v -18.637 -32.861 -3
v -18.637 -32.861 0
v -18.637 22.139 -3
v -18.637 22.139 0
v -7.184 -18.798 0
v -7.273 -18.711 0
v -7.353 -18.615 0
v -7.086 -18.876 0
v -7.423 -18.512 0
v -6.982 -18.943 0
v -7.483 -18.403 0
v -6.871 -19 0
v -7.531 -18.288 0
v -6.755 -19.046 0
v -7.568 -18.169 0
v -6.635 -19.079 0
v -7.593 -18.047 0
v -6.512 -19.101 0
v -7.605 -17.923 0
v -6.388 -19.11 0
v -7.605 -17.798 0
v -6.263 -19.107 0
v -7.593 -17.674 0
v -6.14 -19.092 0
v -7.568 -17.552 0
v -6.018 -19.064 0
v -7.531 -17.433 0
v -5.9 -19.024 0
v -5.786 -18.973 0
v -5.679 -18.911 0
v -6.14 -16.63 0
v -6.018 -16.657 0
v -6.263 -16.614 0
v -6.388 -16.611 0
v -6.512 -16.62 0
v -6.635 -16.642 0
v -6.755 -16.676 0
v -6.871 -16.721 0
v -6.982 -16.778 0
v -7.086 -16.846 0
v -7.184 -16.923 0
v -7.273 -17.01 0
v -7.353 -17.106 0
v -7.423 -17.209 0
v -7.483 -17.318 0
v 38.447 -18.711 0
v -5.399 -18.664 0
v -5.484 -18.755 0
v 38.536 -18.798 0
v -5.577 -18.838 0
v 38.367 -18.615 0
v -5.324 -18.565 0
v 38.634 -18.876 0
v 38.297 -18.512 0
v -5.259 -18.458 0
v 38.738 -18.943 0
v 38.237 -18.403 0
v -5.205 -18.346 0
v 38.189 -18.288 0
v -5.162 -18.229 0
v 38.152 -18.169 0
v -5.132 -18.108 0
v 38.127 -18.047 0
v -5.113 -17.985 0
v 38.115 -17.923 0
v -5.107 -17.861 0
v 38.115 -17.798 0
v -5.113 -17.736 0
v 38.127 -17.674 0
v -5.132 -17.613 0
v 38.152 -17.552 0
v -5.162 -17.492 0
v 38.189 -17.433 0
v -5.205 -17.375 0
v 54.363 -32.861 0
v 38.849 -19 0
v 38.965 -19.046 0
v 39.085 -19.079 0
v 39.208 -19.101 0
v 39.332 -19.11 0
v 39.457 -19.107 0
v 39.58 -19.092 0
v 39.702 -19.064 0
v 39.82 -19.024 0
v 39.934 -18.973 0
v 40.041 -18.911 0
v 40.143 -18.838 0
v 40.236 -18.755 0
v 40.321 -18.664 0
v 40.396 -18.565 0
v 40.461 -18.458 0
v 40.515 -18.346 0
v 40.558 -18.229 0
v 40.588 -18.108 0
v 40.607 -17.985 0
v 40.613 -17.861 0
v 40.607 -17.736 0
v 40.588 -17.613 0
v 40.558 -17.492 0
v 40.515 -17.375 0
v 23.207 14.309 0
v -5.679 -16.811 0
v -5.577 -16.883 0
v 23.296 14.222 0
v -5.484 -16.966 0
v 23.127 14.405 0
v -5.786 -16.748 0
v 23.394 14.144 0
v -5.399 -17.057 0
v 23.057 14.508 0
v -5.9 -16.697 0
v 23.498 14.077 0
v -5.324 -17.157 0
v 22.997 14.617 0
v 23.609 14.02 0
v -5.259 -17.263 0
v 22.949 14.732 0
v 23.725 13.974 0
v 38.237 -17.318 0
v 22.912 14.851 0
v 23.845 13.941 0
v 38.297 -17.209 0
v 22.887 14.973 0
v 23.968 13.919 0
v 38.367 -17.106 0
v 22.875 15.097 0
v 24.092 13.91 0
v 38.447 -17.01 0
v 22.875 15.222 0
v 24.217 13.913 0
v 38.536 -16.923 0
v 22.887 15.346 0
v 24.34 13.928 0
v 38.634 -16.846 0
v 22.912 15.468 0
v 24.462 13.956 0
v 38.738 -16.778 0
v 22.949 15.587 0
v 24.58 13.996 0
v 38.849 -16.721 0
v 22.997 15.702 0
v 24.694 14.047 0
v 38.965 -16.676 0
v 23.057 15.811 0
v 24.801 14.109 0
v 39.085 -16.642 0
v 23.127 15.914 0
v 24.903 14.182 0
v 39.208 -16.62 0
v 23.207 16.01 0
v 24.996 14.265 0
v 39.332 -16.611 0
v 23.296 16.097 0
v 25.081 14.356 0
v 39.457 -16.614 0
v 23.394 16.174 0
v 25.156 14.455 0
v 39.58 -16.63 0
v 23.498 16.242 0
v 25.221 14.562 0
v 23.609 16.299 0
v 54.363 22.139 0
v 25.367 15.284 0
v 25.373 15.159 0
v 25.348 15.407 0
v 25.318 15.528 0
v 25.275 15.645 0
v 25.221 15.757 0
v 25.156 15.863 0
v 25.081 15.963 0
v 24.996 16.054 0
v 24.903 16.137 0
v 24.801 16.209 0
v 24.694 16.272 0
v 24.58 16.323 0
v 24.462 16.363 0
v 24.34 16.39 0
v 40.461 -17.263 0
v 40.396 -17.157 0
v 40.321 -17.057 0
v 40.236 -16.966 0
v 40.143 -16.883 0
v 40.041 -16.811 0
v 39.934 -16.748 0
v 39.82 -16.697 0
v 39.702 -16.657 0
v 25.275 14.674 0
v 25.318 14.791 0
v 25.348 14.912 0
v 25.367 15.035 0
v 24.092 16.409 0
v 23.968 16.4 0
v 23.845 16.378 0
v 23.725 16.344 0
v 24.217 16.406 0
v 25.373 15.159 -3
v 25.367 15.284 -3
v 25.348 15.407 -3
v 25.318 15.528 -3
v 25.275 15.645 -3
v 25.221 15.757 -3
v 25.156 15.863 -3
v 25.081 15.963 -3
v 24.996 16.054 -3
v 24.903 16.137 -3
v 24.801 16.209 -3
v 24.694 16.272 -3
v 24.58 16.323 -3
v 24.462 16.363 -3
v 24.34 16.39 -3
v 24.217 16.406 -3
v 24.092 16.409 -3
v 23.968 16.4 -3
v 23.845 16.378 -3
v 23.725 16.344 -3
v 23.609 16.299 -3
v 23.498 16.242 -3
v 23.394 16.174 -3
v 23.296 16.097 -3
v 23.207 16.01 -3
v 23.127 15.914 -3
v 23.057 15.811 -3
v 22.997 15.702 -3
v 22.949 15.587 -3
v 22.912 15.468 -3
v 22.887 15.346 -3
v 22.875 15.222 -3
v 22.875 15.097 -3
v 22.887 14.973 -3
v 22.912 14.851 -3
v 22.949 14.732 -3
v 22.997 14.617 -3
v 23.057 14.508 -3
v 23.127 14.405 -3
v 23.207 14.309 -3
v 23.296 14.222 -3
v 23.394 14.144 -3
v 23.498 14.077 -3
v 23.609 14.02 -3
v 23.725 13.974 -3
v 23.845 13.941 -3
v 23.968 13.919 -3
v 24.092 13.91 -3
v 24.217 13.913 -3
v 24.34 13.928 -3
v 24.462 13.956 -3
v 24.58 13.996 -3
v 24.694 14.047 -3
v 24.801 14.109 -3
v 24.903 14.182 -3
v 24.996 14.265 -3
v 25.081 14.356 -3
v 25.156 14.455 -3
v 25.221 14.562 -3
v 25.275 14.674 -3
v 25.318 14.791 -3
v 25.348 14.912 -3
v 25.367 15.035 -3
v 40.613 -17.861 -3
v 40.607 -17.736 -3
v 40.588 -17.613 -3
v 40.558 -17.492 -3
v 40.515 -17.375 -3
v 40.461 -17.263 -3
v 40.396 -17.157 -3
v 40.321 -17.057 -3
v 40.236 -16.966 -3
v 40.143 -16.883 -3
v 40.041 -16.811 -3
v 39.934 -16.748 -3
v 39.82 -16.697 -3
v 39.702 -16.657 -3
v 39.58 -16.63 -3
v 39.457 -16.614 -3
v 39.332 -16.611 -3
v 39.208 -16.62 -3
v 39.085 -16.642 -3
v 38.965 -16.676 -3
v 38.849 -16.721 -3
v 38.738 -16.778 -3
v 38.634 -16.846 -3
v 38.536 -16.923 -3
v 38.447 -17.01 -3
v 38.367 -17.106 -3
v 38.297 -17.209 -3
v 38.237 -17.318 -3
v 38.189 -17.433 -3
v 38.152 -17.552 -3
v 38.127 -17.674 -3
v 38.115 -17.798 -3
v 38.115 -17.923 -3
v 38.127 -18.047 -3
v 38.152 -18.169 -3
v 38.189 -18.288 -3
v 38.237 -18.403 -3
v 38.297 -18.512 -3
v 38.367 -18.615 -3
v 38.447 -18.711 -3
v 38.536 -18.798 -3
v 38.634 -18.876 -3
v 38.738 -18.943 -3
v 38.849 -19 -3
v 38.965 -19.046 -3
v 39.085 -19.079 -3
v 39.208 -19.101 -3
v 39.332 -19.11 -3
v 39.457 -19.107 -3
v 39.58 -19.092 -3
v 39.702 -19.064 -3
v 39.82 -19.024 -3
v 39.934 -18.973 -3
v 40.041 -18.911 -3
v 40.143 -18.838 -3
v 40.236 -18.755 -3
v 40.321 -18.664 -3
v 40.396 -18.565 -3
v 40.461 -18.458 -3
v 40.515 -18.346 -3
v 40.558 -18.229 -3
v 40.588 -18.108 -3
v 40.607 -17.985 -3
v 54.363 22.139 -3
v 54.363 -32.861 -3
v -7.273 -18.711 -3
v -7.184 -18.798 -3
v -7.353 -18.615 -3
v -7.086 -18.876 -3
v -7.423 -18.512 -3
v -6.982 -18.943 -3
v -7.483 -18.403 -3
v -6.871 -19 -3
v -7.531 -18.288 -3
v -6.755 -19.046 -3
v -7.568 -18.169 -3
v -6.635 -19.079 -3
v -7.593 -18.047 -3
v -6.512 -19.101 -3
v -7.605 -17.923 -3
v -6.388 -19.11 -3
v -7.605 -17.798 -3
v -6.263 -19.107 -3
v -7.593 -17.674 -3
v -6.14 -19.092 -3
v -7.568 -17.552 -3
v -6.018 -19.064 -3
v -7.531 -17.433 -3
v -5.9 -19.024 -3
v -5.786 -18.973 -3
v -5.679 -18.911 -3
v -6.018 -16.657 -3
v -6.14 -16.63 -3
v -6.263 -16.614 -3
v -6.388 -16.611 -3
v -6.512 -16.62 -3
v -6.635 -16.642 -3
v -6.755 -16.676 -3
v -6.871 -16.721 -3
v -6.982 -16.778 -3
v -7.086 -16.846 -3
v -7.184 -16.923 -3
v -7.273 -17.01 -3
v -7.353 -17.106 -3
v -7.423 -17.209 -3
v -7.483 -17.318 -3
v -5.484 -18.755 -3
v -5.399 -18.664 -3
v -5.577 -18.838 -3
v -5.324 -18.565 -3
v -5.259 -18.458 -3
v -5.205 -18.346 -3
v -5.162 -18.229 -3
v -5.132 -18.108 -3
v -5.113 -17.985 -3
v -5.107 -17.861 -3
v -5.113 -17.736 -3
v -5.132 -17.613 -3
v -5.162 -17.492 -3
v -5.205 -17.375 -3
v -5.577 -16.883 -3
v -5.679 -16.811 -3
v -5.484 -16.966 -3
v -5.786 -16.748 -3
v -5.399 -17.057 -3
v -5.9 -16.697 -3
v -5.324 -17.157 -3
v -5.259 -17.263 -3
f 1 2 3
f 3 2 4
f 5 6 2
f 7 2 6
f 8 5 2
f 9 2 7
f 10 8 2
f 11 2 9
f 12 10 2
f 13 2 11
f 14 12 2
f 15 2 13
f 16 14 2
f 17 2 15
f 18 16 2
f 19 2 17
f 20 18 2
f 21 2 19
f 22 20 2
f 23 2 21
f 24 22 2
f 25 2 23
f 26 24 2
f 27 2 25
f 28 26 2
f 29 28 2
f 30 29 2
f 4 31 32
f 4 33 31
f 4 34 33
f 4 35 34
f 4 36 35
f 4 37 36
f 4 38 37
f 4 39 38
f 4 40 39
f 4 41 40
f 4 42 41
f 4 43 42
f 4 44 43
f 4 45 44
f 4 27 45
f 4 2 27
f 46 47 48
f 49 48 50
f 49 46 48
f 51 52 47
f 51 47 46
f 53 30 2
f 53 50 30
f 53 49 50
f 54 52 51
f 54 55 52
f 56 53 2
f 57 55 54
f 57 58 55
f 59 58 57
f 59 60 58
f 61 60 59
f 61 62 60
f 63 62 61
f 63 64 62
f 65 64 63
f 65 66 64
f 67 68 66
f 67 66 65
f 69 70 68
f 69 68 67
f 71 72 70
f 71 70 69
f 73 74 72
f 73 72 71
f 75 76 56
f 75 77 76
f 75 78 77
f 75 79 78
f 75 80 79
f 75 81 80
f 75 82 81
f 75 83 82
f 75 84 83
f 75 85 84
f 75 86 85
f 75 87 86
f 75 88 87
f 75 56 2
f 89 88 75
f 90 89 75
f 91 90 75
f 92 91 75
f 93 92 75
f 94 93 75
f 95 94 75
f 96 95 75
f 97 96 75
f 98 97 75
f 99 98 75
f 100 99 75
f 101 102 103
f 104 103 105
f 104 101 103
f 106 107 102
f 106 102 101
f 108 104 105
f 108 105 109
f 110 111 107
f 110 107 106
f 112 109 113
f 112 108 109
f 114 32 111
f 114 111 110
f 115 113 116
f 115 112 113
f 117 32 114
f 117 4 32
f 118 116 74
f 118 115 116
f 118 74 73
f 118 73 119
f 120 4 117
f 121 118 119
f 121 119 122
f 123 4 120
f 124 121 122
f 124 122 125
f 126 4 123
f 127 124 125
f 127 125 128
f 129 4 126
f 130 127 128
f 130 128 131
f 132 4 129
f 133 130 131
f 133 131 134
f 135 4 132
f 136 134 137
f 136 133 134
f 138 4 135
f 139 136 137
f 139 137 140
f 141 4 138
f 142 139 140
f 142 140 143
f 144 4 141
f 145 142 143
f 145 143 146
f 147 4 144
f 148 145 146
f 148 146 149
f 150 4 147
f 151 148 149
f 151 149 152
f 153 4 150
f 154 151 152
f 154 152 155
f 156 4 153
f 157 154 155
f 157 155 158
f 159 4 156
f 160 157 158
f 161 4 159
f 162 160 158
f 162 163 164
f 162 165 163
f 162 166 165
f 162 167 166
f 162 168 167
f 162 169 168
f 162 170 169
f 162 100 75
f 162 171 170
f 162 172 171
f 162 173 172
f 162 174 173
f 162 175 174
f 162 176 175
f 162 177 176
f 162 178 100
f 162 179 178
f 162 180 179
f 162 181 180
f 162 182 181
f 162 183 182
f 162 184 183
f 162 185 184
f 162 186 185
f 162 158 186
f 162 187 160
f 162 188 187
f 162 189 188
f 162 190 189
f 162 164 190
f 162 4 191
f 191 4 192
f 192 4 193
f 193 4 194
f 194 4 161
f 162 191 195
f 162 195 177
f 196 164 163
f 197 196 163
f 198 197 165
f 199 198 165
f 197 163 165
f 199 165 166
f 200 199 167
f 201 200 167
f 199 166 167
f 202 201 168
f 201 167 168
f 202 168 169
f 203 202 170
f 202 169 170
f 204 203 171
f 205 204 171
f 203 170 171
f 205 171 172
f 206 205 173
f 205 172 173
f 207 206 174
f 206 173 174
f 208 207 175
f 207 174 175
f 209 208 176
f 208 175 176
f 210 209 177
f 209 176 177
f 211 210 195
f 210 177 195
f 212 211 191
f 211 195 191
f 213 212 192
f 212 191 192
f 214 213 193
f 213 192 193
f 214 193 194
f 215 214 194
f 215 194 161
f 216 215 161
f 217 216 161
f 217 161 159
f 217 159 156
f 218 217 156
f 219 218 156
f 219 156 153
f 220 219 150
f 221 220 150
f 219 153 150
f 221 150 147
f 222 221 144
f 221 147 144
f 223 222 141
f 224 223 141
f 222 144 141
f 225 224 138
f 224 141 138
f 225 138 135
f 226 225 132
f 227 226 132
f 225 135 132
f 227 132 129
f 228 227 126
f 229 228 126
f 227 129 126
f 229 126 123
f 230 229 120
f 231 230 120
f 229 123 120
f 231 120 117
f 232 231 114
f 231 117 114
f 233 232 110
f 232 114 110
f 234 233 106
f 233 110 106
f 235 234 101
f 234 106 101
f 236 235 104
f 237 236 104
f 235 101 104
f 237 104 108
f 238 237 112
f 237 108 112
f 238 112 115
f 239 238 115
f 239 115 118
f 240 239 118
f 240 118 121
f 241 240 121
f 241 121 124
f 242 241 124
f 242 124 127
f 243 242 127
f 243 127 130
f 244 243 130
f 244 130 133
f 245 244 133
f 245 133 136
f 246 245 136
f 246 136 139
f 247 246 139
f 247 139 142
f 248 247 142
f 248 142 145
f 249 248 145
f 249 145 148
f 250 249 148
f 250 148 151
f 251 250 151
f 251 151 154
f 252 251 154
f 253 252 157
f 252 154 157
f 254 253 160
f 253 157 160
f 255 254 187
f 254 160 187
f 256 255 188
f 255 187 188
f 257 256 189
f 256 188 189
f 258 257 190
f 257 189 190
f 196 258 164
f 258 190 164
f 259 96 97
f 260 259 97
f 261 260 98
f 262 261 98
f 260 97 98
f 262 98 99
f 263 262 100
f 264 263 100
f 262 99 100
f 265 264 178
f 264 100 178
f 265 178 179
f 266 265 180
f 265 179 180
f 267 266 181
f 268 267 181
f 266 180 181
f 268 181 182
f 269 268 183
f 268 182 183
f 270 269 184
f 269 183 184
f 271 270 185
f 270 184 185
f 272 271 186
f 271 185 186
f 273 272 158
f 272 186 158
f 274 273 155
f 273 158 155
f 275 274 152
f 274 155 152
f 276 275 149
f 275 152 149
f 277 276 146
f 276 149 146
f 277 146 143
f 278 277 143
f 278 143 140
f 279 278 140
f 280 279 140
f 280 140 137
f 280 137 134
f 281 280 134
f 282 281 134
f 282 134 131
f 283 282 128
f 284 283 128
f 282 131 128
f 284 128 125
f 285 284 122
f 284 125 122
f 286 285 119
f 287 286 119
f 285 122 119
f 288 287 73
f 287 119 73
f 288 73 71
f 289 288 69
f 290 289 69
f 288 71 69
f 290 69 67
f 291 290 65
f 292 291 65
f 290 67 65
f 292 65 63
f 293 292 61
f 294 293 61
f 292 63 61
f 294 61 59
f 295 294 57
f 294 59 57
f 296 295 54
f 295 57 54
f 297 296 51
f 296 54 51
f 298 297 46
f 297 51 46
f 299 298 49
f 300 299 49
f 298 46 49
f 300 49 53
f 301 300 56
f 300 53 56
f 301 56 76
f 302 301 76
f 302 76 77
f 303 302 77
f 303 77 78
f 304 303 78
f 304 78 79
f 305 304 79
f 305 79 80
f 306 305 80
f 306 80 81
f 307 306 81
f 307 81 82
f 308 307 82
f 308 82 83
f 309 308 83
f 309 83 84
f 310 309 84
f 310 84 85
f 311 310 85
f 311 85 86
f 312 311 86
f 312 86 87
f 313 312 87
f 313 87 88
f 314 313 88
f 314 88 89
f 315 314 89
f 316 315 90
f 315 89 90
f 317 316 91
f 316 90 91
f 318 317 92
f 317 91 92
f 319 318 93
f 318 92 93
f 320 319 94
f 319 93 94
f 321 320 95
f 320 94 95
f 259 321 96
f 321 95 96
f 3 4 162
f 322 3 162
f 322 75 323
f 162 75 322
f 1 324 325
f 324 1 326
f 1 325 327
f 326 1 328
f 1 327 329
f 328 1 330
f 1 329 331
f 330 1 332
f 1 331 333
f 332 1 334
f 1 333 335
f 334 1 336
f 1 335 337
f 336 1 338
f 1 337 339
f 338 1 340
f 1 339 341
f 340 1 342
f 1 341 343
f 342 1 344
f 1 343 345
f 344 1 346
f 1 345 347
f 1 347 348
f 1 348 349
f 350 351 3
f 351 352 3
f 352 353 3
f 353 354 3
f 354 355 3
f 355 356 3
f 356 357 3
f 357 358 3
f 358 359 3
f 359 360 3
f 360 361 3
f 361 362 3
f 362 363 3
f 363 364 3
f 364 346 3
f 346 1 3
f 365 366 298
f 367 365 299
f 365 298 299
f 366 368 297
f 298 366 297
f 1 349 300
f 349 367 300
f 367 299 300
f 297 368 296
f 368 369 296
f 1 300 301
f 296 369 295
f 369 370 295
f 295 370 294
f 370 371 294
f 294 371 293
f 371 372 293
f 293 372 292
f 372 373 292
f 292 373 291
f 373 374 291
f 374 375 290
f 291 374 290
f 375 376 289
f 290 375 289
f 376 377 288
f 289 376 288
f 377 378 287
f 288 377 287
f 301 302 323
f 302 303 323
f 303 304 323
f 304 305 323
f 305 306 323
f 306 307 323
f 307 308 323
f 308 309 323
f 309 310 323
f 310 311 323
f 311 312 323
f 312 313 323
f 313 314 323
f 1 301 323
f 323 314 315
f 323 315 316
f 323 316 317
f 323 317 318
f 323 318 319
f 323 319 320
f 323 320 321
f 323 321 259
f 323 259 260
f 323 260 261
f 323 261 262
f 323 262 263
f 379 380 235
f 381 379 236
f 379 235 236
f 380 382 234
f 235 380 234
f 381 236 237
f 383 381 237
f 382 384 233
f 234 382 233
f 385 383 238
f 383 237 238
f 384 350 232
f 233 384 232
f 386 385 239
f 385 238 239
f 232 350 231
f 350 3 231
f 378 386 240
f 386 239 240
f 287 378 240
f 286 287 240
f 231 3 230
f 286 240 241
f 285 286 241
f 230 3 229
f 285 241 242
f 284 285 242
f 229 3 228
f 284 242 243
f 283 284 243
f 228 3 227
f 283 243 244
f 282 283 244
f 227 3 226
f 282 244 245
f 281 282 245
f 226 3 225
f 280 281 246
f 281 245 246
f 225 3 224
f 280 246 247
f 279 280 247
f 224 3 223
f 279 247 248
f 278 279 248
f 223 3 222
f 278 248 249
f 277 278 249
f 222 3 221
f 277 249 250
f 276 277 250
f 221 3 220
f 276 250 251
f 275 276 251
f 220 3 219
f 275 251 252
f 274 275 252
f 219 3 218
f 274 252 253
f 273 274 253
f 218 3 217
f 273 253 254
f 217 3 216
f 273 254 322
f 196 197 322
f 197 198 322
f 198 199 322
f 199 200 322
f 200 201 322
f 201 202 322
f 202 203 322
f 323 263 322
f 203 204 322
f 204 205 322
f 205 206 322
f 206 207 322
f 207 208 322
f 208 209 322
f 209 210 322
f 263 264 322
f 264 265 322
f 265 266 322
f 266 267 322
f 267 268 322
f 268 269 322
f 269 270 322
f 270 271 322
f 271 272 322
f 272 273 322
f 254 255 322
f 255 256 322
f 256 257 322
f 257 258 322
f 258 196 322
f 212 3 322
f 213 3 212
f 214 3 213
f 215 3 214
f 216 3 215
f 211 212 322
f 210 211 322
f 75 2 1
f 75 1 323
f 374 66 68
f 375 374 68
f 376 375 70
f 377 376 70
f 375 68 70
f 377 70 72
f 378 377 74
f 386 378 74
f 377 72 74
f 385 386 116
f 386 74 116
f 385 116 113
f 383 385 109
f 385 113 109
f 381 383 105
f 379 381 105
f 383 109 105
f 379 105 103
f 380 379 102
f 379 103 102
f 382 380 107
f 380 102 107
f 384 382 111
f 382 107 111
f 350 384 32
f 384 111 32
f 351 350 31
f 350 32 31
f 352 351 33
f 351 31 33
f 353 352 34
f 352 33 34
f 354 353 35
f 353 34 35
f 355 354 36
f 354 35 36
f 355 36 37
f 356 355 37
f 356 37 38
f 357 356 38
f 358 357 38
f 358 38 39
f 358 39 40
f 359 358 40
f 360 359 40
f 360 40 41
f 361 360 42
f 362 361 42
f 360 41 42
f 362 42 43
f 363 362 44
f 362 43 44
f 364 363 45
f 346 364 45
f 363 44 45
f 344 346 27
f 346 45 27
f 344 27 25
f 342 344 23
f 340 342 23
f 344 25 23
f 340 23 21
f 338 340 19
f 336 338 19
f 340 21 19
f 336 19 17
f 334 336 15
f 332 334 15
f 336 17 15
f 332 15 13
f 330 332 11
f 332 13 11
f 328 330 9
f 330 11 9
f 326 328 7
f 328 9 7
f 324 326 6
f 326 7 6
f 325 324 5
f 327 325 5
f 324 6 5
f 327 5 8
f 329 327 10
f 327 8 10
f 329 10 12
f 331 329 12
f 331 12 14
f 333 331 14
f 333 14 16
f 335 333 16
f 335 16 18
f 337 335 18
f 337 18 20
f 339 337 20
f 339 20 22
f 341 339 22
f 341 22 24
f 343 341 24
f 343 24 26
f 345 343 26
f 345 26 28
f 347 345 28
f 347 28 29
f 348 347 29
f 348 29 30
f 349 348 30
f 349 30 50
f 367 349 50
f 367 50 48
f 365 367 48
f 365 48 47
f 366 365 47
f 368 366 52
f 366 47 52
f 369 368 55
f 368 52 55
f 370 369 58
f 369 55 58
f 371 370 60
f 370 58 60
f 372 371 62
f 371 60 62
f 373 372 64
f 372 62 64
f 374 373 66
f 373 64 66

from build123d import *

# Parameters (mm, degrees)
F0_W     = 73
F0_H     = 55
F0_R     = 3.5
F0_R_2   = 1.25
F1_DEPTH = 3


# Not quite as in the source:
# - a feature names something its author has since deleted; it is built from what else it names


with BuildPart() as f1:
    # F0 (on Top) → F1 (new body)
    with BuildSketch(Plane.XY):
        with Locations((17.8632747996, -5.3606596088)):
            Rectangle(F0_W, F0_H)
        with Locations((-6.3567252004, -17.8606596088)):
            Circle(F0_R, mode=Mode.SUBTRACT)
        with BuildLine():
            ThreePointArc((39.3632747996, -14.3606596088), (41.8381485337, -15.3857858747), (42.8632747996, -17.8606596088))
            ThreePointArc((42.8632747996, -17.8606596088), (41.8381485337, -20.335533343), (39.3632747996, -21.3606596088))
            ThreePointArc((39.3632747996, -21.3606596088), (35.8632747996, -17.8606596088), (39.3632747996, -14.3606596088))
        make_face(mode=Mode.SUBTRACT)
        with Locations((24.1232747996, 15.1593403912)):
            Circle(F0_R, mode=Mode.SUBTRACT)
        with Locations((24.1232747996, 15.1593403912)):
            Circle(F0_R)
        with Locations((24.1232747996, 15.1593403912)):
            Circle(F0_R_2, mode=Mode.SUBTRACT)
        with BuildLine():
            ThreePointArc((39.3632747996, -21.3606596088), (41.8381485337, -20.335533343), (42.8632747996, -17.8606596088))
            ThreePointArc((42.8632747996, -17.8606596088), (41.8381485337, -15.3857858747), (39.3632747996, -14.3606596088))
            ThreePointArc((39.3632747996, -14.3606596088), (35.8632747996, -17.8606596088), (39.3632747996, -21.3606596088))
        make_face()
        with Locations((39.3632747996, -17.8606596088)):
            Circle(F0_R_2, mode=Mode.SUBTRACT)
        with Locations((-6.3567252004, -17.8606596088)):
            Circle(F0_R)
        with Locations((-6.3567252004, -17.8606596088)):
            Circle(F0_R_2, mode=Mode.SUBTRACT)
    extrude(amount=-F1_DEPTH)


solid = f1.part
